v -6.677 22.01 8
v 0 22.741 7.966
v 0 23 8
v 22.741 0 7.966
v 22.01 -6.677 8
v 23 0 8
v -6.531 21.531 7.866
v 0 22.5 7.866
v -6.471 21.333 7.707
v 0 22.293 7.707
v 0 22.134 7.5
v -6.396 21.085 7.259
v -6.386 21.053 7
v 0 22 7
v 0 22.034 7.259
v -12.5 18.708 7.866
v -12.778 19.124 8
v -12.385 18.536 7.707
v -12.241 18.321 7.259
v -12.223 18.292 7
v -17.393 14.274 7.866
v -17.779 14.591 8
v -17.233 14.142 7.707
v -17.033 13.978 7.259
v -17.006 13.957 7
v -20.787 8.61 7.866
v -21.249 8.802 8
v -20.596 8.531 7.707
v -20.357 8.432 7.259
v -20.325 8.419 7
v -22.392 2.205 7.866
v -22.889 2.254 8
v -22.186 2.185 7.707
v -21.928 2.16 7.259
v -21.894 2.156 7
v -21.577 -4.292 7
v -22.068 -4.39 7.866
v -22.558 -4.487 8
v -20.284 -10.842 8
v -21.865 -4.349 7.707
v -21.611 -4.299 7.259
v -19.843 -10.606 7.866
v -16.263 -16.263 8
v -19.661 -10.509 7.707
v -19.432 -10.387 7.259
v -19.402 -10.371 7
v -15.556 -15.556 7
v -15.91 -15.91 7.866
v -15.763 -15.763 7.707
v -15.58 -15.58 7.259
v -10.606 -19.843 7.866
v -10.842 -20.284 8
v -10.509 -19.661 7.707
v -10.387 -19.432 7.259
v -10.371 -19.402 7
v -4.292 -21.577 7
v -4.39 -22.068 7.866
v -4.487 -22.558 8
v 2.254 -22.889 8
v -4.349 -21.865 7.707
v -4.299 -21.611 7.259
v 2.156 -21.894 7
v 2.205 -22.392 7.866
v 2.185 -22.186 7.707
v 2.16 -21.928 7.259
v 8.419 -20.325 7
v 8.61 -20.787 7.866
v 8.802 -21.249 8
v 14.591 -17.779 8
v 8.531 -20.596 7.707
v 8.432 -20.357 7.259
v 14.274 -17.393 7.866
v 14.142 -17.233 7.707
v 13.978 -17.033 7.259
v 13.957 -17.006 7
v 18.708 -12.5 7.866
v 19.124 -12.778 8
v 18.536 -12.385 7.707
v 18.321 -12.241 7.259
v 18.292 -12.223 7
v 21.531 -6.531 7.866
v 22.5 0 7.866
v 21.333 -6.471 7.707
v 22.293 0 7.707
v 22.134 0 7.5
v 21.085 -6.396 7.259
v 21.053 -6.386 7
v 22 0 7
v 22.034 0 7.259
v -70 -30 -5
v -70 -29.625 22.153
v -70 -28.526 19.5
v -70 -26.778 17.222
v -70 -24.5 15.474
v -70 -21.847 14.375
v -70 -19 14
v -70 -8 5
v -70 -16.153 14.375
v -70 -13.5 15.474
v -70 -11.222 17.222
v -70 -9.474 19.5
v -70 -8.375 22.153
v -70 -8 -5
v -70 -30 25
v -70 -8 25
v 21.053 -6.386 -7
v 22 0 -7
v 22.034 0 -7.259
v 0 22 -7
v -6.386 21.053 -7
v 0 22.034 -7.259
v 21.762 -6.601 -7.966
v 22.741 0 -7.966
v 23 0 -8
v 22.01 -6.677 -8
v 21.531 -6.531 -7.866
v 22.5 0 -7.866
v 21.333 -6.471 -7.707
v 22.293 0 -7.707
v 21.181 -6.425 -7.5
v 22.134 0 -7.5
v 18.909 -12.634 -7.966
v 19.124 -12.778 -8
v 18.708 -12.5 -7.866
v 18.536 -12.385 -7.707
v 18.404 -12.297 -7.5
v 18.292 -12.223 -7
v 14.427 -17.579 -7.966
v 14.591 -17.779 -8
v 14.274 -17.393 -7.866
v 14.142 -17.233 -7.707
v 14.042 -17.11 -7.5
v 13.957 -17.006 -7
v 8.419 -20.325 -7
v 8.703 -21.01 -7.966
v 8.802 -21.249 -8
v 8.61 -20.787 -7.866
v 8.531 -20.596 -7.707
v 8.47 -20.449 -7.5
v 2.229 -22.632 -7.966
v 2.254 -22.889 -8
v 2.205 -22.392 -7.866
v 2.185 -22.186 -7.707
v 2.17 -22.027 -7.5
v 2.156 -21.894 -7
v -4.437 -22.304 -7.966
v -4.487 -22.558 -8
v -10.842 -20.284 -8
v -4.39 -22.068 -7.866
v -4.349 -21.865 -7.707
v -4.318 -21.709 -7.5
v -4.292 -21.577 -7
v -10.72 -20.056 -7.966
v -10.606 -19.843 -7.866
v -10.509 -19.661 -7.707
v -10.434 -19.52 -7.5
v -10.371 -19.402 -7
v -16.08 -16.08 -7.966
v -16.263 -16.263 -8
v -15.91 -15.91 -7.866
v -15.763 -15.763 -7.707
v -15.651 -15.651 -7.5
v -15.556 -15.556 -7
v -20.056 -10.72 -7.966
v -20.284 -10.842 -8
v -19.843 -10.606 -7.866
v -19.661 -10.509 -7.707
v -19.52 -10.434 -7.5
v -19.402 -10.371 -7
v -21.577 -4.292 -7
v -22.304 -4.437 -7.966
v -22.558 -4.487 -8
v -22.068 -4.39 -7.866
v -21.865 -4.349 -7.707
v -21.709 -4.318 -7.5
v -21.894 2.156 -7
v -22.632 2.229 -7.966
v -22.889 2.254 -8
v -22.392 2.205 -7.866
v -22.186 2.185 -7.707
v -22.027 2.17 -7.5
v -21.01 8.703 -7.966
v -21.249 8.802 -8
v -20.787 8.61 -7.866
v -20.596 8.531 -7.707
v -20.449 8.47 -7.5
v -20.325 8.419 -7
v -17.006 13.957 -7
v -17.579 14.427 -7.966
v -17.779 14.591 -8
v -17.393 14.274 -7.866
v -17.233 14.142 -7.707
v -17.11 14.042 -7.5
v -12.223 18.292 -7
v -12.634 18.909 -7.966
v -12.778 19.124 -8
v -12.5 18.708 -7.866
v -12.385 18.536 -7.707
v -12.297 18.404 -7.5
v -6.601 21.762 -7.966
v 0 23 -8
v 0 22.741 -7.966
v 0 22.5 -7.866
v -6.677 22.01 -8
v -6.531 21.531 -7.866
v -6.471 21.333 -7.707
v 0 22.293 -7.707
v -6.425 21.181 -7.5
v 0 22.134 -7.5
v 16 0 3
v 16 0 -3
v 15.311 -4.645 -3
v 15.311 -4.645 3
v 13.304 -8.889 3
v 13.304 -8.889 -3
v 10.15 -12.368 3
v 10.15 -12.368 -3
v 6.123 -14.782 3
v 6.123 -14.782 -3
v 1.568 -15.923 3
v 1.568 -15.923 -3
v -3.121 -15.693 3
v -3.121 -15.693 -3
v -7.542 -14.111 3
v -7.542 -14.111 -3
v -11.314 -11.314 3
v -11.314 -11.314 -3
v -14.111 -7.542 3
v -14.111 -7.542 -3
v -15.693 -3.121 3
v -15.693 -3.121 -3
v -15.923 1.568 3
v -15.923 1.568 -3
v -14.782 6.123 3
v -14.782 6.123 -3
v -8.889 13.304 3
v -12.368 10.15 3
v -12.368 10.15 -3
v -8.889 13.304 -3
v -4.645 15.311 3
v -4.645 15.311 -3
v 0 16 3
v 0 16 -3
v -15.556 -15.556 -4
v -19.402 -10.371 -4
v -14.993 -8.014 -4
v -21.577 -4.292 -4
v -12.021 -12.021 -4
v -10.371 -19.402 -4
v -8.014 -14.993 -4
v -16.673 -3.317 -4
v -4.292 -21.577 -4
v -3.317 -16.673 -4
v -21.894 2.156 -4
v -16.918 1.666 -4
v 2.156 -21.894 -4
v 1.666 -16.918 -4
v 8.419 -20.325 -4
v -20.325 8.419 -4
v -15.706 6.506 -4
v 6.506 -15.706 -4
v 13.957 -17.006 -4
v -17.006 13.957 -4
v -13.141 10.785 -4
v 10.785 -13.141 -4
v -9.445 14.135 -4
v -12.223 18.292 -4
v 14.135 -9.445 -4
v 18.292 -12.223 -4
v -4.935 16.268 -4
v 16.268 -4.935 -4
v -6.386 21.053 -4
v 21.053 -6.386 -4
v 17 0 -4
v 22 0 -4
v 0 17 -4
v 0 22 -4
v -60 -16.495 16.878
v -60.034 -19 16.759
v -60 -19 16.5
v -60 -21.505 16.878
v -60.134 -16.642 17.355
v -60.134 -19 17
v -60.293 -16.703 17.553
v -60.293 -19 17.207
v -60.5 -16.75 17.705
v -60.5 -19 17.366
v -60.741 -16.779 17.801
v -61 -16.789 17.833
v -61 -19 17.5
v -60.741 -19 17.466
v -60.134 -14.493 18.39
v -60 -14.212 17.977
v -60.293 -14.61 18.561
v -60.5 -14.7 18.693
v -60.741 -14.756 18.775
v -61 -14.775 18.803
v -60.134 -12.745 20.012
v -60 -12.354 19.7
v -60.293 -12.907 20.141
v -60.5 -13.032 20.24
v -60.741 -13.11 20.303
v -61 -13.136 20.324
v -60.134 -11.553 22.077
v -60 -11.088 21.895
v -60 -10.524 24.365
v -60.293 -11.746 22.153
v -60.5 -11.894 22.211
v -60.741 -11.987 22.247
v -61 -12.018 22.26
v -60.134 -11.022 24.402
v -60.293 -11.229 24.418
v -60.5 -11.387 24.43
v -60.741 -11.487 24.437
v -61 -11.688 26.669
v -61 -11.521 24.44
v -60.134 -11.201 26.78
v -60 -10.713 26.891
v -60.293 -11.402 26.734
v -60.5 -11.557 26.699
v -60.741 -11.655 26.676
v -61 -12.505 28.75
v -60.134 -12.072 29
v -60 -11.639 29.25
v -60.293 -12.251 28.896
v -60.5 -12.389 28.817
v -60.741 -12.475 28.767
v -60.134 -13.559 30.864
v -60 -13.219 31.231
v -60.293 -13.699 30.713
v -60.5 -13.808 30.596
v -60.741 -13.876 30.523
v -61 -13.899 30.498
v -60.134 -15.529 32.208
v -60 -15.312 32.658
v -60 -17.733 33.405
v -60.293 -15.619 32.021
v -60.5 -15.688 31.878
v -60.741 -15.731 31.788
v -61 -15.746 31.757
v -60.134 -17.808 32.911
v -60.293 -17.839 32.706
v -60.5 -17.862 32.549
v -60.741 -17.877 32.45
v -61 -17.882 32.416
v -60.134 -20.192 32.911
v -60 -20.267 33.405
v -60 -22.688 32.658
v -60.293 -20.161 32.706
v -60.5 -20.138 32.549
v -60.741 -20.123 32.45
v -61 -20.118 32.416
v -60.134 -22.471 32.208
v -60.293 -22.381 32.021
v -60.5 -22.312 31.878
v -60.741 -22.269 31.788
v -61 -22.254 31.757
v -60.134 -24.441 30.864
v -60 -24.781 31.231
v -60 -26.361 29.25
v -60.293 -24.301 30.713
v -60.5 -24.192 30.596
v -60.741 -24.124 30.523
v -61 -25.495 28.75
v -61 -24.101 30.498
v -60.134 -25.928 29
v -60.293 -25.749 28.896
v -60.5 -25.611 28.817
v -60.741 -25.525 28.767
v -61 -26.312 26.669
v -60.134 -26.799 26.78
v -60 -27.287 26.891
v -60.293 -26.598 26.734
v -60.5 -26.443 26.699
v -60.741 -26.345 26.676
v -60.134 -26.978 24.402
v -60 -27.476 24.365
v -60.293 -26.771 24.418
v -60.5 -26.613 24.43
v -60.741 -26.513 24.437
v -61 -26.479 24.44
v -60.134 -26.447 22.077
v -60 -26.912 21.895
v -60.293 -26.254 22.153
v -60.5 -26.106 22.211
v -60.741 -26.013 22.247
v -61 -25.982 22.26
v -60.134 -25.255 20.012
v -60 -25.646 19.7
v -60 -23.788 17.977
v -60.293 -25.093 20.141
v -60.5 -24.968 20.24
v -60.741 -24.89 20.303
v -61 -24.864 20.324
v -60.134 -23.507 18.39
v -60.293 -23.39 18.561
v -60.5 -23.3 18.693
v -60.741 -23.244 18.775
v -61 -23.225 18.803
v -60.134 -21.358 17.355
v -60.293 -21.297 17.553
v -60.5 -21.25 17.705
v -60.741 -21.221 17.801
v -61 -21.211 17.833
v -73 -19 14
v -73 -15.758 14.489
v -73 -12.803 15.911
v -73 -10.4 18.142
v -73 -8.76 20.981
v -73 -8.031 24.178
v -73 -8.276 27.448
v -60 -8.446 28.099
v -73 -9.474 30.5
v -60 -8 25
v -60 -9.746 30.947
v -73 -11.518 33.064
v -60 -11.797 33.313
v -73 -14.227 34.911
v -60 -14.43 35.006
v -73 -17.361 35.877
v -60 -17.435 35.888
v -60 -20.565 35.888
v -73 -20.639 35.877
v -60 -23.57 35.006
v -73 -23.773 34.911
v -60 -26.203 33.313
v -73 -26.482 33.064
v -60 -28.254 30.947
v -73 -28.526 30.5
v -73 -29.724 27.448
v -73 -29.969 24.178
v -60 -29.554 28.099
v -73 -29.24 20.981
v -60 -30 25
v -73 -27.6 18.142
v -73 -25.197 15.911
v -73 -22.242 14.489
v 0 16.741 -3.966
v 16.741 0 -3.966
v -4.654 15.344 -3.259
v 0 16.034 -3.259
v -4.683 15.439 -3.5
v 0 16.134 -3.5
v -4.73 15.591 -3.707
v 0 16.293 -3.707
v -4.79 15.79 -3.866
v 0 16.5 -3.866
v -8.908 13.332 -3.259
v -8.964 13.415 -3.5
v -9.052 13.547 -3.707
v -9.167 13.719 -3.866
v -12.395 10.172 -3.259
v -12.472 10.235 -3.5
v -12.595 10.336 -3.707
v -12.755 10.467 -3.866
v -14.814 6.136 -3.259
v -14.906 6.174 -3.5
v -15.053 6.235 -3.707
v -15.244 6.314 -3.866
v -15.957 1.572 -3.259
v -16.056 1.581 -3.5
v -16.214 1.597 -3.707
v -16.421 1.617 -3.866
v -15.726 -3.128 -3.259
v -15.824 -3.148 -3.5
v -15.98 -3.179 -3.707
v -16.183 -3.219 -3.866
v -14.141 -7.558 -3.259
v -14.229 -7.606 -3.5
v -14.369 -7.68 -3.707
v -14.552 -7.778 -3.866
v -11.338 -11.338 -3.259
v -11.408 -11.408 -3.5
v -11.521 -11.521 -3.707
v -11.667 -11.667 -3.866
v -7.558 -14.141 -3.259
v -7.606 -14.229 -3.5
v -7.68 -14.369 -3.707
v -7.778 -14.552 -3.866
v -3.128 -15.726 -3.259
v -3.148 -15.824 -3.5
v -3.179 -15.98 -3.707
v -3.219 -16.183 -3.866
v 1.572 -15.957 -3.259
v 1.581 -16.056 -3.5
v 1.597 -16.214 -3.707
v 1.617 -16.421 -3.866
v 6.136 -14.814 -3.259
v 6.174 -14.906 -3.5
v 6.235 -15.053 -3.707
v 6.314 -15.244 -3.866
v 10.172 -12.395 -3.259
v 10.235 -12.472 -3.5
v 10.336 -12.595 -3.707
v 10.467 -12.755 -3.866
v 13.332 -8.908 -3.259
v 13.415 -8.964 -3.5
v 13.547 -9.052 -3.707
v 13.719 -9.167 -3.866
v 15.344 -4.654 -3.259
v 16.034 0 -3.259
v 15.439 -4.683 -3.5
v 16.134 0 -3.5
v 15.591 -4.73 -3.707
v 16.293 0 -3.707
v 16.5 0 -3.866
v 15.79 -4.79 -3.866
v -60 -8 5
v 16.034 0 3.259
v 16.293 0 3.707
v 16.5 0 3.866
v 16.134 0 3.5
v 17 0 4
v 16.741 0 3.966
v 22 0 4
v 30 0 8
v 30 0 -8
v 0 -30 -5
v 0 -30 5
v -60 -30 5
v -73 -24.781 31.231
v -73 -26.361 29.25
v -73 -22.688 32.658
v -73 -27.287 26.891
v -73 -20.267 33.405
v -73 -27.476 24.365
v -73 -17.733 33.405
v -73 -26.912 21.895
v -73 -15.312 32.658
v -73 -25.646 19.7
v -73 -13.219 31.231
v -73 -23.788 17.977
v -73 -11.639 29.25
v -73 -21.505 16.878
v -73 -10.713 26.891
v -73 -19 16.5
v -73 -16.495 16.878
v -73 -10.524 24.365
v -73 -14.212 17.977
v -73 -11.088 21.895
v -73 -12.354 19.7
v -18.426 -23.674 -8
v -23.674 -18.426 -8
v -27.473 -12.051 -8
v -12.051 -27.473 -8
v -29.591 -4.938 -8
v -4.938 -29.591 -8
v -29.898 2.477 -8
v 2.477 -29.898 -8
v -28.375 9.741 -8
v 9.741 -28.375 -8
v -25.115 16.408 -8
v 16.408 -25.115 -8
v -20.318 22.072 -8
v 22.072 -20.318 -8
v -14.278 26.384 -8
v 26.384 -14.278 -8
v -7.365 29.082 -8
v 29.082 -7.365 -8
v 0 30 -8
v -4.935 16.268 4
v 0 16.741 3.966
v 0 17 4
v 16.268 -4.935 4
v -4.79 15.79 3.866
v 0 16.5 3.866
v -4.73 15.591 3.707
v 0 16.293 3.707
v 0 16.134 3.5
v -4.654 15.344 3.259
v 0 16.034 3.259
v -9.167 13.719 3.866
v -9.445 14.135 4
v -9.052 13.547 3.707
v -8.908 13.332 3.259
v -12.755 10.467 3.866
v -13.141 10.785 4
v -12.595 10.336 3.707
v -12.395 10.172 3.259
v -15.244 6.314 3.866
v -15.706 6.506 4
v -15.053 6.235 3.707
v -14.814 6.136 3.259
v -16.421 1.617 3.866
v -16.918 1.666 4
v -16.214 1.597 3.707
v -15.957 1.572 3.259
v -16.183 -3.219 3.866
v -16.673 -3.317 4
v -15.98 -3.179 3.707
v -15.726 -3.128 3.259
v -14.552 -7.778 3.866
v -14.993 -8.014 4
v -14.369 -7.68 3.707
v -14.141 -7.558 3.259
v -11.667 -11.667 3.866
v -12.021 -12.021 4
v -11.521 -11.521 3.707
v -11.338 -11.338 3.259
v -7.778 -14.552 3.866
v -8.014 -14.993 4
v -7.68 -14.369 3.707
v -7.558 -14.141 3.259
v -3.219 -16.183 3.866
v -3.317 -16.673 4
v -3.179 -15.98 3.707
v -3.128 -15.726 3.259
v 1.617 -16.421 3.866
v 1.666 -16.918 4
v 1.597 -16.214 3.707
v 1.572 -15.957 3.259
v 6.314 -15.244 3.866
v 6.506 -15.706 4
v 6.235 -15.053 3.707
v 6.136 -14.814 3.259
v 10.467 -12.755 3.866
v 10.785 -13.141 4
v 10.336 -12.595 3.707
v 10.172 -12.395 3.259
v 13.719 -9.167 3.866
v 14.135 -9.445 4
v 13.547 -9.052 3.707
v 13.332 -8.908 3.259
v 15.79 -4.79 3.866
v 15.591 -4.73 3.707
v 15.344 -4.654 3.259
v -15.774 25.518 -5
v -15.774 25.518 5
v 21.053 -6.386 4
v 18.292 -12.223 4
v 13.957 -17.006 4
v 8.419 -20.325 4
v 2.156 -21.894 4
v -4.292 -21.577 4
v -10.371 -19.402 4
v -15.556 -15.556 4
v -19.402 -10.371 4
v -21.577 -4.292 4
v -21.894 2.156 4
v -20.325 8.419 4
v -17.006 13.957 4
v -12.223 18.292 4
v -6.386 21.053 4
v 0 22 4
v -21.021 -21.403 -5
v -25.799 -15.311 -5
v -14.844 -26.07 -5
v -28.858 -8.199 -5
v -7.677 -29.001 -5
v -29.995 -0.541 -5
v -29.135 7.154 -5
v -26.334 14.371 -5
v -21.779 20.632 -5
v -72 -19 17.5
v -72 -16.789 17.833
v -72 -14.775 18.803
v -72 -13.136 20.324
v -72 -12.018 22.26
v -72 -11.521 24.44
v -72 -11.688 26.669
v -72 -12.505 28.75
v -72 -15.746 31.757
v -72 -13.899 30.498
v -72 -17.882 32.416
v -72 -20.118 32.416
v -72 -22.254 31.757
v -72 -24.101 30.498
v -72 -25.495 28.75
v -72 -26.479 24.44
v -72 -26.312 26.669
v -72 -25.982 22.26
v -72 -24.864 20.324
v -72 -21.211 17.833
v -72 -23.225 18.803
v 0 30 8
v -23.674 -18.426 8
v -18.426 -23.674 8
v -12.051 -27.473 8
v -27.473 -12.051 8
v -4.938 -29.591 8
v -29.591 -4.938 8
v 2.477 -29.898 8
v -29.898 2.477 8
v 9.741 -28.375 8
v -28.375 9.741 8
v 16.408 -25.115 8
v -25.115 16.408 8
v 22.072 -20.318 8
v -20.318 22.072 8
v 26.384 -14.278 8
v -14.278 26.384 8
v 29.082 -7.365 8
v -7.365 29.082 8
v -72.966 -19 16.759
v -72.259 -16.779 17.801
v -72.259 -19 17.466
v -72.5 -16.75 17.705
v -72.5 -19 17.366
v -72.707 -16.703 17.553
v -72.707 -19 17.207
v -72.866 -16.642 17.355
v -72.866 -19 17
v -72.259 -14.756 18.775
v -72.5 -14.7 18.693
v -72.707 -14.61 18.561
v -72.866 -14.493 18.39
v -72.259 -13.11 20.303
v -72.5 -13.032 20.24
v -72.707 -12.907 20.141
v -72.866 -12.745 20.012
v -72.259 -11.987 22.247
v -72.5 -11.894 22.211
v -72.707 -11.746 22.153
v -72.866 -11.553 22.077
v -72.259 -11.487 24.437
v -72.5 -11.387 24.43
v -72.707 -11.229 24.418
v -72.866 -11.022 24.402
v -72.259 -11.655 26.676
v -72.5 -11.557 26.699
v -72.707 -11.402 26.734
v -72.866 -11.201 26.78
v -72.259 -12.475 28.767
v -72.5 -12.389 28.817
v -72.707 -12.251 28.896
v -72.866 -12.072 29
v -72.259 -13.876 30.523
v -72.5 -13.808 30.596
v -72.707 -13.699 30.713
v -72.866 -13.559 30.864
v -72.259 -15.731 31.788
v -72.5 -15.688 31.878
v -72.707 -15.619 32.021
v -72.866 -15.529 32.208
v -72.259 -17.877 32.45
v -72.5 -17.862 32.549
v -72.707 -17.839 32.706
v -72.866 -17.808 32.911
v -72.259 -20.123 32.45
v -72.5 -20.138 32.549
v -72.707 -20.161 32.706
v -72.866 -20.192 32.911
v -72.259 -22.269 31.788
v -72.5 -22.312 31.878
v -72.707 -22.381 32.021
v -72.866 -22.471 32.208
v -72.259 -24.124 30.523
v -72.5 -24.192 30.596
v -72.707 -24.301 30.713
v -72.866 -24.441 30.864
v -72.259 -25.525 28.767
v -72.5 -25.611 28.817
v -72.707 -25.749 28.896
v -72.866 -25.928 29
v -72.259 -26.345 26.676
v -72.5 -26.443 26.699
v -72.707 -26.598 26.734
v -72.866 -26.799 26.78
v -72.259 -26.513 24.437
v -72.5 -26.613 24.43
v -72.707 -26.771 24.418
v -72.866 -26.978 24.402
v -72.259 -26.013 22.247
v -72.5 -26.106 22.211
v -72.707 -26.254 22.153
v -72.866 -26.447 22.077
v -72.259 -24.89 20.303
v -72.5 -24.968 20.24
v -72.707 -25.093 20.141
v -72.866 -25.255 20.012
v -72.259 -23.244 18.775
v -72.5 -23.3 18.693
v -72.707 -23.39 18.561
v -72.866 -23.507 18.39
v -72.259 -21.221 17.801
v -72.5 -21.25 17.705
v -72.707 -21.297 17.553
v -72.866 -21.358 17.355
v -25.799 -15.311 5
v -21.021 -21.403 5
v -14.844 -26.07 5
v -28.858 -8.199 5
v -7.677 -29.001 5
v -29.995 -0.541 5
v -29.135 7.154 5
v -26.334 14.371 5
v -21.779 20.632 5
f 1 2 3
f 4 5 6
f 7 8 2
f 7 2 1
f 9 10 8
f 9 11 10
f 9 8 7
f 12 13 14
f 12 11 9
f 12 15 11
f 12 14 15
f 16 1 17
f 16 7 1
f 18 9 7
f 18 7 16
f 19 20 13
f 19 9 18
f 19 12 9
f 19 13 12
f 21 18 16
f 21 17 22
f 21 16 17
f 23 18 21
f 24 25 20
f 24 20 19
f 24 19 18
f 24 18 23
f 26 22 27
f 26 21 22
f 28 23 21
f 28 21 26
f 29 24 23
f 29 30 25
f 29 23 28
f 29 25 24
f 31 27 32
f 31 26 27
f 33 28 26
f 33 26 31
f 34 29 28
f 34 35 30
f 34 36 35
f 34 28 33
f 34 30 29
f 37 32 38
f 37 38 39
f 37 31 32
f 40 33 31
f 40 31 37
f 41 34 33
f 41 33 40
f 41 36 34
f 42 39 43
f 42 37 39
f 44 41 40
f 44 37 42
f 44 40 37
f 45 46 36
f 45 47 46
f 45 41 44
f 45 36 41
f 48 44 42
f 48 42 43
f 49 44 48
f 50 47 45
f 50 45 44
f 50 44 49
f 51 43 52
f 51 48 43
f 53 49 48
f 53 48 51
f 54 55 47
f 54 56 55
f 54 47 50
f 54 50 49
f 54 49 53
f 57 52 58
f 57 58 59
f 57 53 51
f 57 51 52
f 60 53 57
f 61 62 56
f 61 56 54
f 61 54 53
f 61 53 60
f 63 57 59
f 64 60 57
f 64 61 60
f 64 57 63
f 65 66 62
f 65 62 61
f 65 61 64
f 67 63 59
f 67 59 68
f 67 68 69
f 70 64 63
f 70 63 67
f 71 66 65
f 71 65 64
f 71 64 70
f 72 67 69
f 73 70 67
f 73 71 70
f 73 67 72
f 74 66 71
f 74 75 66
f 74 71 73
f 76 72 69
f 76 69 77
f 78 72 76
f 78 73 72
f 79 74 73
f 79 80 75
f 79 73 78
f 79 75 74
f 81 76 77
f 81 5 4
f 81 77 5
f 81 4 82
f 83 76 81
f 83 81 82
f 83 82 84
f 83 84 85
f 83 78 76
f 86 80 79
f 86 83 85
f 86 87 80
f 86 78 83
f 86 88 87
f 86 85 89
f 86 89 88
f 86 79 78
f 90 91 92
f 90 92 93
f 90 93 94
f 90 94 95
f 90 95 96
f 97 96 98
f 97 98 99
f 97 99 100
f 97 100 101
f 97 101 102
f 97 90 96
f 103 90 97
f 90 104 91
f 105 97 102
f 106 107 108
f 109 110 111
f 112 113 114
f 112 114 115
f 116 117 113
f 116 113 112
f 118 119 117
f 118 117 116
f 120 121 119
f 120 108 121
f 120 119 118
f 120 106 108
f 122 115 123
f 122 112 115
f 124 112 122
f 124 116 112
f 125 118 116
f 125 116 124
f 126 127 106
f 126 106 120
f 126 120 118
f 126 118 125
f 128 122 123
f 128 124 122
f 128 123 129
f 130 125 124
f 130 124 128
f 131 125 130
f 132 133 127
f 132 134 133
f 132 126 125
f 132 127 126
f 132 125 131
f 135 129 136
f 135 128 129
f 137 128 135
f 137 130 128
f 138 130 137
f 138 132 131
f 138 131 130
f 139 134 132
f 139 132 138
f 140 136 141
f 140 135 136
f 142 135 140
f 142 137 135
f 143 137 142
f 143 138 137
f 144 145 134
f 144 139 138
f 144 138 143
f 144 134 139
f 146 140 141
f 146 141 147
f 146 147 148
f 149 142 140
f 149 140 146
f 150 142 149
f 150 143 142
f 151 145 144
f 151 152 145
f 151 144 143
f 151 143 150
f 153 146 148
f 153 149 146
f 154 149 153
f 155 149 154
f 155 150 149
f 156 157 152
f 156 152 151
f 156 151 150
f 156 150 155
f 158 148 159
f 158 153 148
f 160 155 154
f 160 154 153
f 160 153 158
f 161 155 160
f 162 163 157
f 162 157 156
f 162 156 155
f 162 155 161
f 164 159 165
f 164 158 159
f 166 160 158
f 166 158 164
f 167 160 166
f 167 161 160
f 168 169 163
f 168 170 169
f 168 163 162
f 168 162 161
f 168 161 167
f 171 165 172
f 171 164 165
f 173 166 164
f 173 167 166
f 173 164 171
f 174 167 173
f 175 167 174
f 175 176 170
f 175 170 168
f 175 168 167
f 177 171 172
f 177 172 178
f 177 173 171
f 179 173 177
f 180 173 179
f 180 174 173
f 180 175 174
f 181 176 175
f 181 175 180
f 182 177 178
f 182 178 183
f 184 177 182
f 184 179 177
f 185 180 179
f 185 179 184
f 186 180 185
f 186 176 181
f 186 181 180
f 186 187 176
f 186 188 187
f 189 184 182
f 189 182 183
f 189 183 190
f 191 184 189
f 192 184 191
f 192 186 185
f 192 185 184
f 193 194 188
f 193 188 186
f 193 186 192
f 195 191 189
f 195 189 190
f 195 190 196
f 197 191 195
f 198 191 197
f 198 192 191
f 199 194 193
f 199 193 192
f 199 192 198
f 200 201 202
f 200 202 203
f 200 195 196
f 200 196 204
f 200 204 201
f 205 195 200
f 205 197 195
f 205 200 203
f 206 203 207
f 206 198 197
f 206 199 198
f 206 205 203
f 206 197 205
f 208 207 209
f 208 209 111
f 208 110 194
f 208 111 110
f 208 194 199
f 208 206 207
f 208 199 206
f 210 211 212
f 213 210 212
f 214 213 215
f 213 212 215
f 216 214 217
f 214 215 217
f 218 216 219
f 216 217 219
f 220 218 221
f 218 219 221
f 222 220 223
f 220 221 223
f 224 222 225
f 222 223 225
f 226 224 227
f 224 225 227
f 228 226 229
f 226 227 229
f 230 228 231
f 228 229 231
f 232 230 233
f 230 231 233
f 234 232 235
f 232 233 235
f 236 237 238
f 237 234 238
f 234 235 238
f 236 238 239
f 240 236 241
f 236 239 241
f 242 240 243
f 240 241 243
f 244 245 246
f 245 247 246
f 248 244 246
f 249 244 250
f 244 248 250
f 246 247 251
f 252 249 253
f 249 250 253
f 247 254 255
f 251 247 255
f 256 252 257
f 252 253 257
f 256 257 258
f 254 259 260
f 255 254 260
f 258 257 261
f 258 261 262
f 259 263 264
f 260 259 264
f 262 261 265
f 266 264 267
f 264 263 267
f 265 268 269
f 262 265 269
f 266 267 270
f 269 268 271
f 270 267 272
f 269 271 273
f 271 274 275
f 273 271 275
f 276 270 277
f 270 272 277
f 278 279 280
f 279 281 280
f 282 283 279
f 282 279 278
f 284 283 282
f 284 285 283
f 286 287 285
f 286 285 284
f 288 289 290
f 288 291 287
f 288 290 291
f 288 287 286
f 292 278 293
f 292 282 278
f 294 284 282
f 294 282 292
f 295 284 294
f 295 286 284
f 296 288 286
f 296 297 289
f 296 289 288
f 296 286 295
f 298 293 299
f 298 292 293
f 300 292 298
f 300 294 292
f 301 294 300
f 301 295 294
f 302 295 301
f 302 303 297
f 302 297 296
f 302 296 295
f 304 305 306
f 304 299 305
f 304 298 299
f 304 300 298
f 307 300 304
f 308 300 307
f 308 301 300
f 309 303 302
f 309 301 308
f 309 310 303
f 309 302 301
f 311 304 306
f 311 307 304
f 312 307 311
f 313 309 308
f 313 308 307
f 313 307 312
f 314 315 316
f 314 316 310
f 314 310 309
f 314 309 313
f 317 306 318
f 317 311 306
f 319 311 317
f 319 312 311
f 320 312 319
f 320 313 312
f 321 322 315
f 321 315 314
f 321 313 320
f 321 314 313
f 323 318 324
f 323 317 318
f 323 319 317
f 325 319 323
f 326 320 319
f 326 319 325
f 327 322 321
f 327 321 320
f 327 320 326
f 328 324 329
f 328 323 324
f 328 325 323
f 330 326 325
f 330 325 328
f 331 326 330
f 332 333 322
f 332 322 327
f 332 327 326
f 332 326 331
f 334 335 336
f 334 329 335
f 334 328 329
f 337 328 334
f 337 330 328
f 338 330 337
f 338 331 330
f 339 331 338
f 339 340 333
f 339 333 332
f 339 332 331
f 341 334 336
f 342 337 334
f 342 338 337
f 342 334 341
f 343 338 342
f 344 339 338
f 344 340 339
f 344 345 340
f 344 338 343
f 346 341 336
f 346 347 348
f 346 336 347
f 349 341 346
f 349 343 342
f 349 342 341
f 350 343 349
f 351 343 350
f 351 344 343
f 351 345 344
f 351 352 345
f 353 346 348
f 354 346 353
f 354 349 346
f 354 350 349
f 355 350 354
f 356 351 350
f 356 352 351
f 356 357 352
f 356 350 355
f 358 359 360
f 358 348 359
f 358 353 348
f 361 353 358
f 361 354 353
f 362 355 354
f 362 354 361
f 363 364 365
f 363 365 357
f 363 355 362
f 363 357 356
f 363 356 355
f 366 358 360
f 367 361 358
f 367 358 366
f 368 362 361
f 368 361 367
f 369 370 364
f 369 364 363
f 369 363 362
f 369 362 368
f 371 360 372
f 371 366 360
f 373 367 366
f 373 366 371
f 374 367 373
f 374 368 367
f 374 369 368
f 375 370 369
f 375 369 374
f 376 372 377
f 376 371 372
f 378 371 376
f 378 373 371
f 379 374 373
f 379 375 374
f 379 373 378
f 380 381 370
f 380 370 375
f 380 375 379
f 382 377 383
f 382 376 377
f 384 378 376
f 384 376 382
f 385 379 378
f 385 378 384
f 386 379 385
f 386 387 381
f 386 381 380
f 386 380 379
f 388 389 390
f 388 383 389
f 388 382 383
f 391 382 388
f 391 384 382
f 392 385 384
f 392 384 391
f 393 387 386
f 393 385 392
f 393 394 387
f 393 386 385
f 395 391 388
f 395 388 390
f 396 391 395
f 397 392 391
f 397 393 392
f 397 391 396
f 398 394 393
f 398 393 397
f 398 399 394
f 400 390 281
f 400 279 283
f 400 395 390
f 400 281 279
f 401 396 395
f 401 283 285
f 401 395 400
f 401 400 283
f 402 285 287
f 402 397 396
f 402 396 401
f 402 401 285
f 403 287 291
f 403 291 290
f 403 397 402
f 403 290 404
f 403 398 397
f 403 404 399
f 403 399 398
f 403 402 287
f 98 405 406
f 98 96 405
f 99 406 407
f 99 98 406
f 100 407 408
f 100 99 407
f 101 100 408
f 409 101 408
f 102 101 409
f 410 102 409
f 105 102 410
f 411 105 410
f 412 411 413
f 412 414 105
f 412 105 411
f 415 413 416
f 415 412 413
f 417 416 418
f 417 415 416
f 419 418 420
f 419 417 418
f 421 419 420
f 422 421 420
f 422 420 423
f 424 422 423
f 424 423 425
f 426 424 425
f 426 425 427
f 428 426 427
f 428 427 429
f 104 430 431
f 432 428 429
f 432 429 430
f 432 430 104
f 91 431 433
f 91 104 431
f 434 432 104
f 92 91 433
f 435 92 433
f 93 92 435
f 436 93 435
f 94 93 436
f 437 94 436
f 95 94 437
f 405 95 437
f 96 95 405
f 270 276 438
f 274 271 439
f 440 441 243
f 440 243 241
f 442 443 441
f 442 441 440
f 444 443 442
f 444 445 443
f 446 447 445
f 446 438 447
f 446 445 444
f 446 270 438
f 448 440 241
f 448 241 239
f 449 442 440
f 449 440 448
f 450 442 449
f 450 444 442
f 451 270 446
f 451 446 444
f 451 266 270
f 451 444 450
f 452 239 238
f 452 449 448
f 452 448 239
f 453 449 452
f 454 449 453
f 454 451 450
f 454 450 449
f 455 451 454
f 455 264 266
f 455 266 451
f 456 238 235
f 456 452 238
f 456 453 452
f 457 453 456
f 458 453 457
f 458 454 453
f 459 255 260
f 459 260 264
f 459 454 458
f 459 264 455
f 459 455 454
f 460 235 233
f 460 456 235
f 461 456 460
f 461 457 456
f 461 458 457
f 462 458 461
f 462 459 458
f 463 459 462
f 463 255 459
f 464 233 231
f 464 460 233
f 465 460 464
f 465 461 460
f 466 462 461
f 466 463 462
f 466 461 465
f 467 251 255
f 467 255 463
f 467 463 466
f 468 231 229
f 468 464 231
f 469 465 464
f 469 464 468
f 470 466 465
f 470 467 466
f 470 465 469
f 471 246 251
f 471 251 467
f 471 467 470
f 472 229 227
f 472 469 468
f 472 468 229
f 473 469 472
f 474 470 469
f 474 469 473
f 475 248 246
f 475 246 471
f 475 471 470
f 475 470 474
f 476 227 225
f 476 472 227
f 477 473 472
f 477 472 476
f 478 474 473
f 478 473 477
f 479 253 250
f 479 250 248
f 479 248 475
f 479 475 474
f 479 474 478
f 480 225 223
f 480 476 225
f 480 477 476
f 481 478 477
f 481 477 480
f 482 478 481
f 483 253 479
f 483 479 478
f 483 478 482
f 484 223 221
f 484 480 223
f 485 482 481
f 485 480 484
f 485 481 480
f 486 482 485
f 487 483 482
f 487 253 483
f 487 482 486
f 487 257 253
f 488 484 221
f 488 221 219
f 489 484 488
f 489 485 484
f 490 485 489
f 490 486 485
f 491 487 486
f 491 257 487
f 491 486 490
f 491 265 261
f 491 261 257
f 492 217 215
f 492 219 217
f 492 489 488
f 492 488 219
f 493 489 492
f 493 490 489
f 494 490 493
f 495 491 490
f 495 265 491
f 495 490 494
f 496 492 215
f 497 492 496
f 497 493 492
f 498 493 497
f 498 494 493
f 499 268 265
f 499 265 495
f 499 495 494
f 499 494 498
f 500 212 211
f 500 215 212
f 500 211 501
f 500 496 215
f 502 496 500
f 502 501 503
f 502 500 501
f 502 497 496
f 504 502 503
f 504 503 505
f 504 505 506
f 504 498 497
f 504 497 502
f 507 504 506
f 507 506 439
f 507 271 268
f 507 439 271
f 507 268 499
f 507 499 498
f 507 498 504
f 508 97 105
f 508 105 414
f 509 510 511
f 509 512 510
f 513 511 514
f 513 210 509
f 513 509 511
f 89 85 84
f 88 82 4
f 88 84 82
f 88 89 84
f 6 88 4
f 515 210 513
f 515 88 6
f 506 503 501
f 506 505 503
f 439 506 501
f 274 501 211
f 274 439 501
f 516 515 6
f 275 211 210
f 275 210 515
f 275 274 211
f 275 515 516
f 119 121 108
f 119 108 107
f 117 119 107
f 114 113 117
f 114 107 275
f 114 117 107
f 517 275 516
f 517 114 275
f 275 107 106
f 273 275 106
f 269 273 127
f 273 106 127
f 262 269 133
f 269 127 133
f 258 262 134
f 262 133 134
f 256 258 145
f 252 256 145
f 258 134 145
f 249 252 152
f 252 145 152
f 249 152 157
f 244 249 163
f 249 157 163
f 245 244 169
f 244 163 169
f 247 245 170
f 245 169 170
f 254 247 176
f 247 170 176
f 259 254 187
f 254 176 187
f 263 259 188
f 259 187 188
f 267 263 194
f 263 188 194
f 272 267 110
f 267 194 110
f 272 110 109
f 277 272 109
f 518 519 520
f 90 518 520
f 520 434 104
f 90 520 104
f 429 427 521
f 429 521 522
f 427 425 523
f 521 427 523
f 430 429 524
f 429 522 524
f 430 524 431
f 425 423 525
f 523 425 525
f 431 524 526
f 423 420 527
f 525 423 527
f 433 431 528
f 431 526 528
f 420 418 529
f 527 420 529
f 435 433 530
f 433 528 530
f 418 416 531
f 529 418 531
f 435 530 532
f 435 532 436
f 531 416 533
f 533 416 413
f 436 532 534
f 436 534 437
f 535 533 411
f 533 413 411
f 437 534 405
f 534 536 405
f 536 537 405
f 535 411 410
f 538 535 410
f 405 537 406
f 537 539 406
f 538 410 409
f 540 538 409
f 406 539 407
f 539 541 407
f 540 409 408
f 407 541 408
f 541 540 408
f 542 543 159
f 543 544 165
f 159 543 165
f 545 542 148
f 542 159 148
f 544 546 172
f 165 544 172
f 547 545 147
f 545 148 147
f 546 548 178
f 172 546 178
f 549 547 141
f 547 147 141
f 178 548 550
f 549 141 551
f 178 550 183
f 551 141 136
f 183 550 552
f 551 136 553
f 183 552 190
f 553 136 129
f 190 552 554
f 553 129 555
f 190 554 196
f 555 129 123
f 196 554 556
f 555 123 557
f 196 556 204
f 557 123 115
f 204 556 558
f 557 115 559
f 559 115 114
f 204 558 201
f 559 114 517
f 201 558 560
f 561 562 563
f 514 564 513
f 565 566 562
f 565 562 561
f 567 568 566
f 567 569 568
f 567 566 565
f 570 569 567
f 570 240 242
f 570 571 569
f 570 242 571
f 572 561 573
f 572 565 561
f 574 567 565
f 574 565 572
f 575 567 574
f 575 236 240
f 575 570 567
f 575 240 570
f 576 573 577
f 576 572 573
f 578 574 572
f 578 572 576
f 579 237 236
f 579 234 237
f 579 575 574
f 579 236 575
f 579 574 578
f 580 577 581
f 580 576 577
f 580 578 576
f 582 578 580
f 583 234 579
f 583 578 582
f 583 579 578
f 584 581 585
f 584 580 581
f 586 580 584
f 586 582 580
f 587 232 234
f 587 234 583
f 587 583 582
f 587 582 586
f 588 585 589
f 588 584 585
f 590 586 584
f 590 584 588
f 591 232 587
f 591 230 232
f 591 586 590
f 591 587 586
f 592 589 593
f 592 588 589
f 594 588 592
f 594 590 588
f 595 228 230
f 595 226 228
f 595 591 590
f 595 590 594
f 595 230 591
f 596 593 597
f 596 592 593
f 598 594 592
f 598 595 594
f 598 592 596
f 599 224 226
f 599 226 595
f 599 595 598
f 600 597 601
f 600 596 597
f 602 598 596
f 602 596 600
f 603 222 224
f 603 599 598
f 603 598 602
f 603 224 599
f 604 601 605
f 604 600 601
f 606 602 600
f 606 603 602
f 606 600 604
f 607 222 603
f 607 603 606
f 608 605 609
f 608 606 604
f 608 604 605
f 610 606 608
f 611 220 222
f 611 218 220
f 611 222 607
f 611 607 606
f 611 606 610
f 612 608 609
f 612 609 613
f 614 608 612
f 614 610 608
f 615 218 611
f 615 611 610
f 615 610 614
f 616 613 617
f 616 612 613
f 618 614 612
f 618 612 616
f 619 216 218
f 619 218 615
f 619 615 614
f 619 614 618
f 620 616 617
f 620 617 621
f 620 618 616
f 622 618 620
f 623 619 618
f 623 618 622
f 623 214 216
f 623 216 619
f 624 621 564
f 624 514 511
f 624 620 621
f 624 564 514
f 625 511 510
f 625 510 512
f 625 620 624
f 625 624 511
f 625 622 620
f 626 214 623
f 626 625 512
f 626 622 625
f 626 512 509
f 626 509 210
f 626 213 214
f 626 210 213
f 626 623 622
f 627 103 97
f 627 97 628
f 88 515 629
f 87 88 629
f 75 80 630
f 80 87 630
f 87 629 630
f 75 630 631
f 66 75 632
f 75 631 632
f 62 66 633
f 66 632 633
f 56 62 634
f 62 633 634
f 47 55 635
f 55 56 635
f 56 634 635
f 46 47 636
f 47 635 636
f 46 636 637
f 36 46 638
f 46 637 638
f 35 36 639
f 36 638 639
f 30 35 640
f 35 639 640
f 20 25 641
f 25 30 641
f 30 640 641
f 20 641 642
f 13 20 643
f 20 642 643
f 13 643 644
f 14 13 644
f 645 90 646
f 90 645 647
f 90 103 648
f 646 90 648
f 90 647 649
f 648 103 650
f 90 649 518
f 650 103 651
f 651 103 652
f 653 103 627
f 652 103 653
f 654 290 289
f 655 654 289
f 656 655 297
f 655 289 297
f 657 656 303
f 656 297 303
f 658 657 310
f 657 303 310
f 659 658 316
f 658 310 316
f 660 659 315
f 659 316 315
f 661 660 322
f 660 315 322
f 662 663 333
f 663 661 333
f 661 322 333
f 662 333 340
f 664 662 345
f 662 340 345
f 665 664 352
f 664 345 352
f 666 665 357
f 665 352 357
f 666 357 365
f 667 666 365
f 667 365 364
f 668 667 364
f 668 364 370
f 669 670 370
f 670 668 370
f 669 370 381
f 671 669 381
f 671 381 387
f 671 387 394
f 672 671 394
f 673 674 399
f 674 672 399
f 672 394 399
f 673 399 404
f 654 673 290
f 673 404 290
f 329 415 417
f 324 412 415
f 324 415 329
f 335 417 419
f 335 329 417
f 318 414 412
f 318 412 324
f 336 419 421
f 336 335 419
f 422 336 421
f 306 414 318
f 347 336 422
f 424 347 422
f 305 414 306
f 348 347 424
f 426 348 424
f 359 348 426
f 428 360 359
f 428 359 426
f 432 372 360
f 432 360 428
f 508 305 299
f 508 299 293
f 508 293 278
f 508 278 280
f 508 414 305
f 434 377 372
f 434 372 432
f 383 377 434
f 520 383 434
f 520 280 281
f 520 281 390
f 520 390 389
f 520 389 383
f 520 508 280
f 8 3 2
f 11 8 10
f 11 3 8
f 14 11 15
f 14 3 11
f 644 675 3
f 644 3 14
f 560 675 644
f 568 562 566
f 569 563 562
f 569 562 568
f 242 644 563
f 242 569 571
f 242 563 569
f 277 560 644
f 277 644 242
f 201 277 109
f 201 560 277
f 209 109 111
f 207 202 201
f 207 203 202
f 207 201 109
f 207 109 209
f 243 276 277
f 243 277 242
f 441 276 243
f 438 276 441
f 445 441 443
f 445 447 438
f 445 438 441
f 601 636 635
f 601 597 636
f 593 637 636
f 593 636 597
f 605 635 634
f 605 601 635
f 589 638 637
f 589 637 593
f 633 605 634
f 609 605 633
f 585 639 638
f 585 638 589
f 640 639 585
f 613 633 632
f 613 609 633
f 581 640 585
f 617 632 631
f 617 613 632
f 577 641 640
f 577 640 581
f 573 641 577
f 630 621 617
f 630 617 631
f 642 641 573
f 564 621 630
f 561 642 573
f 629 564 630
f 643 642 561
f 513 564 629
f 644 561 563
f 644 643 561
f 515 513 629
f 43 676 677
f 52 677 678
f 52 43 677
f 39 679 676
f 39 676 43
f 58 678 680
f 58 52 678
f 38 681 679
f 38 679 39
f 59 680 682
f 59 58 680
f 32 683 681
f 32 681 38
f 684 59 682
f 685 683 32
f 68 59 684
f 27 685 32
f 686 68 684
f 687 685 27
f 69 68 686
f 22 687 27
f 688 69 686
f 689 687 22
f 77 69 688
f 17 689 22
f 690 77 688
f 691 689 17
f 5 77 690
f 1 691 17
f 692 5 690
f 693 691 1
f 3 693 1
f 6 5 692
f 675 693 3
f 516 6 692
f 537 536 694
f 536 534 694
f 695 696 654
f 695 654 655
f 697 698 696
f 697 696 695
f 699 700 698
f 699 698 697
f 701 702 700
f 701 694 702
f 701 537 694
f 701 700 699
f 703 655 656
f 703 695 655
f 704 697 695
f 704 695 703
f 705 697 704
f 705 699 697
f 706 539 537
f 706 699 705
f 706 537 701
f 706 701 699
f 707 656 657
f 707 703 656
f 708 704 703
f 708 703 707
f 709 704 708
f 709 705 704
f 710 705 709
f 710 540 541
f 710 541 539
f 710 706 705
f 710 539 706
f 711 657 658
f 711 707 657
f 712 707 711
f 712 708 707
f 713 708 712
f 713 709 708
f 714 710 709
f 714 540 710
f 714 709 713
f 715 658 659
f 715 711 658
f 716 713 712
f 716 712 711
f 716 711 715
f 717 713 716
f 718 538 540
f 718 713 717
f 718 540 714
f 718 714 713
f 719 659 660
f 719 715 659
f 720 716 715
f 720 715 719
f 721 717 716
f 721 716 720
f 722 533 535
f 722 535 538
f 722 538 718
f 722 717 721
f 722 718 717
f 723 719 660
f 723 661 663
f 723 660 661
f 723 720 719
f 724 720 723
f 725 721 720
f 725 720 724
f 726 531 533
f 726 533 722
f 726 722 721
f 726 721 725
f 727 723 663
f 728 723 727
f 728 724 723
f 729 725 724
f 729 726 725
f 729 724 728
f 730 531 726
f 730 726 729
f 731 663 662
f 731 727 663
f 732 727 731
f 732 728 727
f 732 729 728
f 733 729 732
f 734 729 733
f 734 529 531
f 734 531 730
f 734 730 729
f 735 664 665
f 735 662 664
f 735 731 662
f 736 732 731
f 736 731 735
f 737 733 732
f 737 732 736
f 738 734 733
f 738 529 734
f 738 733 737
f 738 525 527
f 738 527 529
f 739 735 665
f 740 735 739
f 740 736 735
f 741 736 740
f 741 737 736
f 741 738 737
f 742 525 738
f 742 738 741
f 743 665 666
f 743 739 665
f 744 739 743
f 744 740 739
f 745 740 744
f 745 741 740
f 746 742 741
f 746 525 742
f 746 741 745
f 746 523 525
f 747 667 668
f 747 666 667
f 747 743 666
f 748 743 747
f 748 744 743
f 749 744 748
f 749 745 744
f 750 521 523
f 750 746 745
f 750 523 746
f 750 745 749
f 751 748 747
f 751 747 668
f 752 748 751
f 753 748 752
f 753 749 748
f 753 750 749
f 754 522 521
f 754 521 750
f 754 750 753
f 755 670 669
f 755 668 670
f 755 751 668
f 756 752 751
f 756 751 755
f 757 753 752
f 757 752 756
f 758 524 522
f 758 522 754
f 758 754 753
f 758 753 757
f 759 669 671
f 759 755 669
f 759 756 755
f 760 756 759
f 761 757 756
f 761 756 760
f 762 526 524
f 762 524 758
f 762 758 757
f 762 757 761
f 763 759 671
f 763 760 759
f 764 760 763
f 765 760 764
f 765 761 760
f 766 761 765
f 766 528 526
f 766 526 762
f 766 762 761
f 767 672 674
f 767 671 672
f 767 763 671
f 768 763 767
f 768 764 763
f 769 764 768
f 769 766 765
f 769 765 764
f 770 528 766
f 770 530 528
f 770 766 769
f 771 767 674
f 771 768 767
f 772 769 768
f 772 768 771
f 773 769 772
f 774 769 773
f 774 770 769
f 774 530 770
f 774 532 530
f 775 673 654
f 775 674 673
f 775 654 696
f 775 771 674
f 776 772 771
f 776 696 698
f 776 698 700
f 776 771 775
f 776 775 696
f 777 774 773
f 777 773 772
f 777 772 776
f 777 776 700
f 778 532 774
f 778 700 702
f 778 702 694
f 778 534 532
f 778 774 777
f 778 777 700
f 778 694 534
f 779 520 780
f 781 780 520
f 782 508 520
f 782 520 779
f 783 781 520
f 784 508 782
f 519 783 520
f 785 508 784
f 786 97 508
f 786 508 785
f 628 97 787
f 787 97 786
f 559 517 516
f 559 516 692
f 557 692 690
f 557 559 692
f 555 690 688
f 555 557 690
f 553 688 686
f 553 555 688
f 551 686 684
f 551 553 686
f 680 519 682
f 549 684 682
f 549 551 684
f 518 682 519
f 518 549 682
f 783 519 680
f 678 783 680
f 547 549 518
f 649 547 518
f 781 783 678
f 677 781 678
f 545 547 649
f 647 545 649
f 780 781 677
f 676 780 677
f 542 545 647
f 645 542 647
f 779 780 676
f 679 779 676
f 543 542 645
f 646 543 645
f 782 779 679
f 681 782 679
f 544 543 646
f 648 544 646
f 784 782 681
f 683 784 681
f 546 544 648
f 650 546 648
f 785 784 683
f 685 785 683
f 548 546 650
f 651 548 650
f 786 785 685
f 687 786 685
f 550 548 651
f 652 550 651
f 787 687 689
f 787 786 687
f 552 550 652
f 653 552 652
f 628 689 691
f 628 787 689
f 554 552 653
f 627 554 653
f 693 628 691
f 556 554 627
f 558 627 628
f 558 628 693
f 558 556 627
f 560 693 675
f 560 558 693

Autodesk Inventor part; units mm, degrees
ref_plane "YZ Plane" through (0, 0, 0) normal (1, 0, 0) x (0, 1, 0)
ref_plane "XZ Plane" through (0, 0, 0) normal (0, 1, 0) x (-1, 0, 0)
ref_plane "XY Plane" through (0, 0, 0) normal (0, 0, 1) x (1, 0, 0)
sketch "스케치1" plane through (0, 0, 0) normal (0, 1, 0) x (-1, 0, 0)
  point P0 (0, 0)
sketch "스케치2" plane through (0, 0, 0) normal (0, 0, 1) x (1, 0, 0)
  arc A0 (0, 16) -> (16, 0) centre (0, 0) ccw
  arc A1 (0, 22) -> (22, 0) centre (0, 0) ccw
  arc A2 (0, 30) -> (30, 0) centre (0, 0) ccw
  line L0 (-70, -8) -> (-60, -8)
  line L1 (-60, -8) -> (-60, -30)
  line L2 (-60, -30) -> (-70, -30)
  line L3 (-70, -30) -> (-70, -8)
  line L4 (-70, -8) -> (-15.7735, 25.5185)
  line L5 (-70, -30) -> (0, -30)
  line L6 (-73, -8) -> (-70, -8)
  line L7 (-73, -8) -> (-73, -30)
  line L8 (-67, -30) -> (-73, -30)
  line L9 (0, 40) -> (0, -40)
  line L10 (-40, 0) -> (40, 0)
  point P0 (-71.5, -8)
  dimension "d0" = 32
  dimension "d1" = 44
  dimension "d2" = 60
  dimension "d4" = 22
  dimension "d5" = 70
  dimension "d7" = 10
  dimension "d8" = 3
  dimension "d13" = 80
  dimension "d14" = 80
extrude "돌출3" add sketch "스케치2" along normal mid plane 8 contours A0 L10 A1 L9 | A0 L9 A1 L10 | A0 L10 A1 L9
extrude "돌출4" add sketch "스케치2" along normal mid plane 16 contours A1 L10 A2 L9 | A1 L9 A2 L10 | A1 L10 A2 L9
extrude "돌출5" add sketch "스케치2" along normal mid plane 10 contours A2 L5 L1 L0 L4
extrude "돌출6" add sketch "스케치2" against normal blind 5 contours L0 L1 L2 L3
extrude "돌출7" add sketch "스케치2" along normal blind 25 contours L0 L1 L2 L3
sketch "스케치4" plane through (-60, -30, 5) normal (1, 0, 0) x (0, 0, -1)
  circle A0 centre (-20, 11) radius 11
  circle A1 centre (-20, 11) radius 7.5
  line L0 (-20, 0) -> (-20, 22) projected
  line L1 (10, 0) -> (10, 55.5185) projected
  line L2 (10, 0) -> (-20, 0)
  line L3 (10, 22) -> (-20, 22)
  point P0 (5, 30)
  point P1 (-5, 0)
  point P2 (-20, 18.5)
  point P3 (-20, 3.5)
  dimension "d28" = 22
  dimension "d29" = 15
  dimension "d30" = 30
extrude "돌출8" add sketch "스케치4" against normal blind 13 contours A0 L0 A1 | L0 A1 A0
extrude "돌출9" cut sketch "스케치4" against normal blind 13 contours A1 L0 picked at (-15.876, 12.5587)
fillet "모깎기1" radius 1 6 edges at (-11.3137, -11.3137, 4) (-15.5563, -15.5563, 8) (-60, -11.5, 25) (-11.3137, -11.3137, -4) (-15.5563, -15.5563, -8) (-73, -19, 32.5)
properties part number "Day02_Task02"
